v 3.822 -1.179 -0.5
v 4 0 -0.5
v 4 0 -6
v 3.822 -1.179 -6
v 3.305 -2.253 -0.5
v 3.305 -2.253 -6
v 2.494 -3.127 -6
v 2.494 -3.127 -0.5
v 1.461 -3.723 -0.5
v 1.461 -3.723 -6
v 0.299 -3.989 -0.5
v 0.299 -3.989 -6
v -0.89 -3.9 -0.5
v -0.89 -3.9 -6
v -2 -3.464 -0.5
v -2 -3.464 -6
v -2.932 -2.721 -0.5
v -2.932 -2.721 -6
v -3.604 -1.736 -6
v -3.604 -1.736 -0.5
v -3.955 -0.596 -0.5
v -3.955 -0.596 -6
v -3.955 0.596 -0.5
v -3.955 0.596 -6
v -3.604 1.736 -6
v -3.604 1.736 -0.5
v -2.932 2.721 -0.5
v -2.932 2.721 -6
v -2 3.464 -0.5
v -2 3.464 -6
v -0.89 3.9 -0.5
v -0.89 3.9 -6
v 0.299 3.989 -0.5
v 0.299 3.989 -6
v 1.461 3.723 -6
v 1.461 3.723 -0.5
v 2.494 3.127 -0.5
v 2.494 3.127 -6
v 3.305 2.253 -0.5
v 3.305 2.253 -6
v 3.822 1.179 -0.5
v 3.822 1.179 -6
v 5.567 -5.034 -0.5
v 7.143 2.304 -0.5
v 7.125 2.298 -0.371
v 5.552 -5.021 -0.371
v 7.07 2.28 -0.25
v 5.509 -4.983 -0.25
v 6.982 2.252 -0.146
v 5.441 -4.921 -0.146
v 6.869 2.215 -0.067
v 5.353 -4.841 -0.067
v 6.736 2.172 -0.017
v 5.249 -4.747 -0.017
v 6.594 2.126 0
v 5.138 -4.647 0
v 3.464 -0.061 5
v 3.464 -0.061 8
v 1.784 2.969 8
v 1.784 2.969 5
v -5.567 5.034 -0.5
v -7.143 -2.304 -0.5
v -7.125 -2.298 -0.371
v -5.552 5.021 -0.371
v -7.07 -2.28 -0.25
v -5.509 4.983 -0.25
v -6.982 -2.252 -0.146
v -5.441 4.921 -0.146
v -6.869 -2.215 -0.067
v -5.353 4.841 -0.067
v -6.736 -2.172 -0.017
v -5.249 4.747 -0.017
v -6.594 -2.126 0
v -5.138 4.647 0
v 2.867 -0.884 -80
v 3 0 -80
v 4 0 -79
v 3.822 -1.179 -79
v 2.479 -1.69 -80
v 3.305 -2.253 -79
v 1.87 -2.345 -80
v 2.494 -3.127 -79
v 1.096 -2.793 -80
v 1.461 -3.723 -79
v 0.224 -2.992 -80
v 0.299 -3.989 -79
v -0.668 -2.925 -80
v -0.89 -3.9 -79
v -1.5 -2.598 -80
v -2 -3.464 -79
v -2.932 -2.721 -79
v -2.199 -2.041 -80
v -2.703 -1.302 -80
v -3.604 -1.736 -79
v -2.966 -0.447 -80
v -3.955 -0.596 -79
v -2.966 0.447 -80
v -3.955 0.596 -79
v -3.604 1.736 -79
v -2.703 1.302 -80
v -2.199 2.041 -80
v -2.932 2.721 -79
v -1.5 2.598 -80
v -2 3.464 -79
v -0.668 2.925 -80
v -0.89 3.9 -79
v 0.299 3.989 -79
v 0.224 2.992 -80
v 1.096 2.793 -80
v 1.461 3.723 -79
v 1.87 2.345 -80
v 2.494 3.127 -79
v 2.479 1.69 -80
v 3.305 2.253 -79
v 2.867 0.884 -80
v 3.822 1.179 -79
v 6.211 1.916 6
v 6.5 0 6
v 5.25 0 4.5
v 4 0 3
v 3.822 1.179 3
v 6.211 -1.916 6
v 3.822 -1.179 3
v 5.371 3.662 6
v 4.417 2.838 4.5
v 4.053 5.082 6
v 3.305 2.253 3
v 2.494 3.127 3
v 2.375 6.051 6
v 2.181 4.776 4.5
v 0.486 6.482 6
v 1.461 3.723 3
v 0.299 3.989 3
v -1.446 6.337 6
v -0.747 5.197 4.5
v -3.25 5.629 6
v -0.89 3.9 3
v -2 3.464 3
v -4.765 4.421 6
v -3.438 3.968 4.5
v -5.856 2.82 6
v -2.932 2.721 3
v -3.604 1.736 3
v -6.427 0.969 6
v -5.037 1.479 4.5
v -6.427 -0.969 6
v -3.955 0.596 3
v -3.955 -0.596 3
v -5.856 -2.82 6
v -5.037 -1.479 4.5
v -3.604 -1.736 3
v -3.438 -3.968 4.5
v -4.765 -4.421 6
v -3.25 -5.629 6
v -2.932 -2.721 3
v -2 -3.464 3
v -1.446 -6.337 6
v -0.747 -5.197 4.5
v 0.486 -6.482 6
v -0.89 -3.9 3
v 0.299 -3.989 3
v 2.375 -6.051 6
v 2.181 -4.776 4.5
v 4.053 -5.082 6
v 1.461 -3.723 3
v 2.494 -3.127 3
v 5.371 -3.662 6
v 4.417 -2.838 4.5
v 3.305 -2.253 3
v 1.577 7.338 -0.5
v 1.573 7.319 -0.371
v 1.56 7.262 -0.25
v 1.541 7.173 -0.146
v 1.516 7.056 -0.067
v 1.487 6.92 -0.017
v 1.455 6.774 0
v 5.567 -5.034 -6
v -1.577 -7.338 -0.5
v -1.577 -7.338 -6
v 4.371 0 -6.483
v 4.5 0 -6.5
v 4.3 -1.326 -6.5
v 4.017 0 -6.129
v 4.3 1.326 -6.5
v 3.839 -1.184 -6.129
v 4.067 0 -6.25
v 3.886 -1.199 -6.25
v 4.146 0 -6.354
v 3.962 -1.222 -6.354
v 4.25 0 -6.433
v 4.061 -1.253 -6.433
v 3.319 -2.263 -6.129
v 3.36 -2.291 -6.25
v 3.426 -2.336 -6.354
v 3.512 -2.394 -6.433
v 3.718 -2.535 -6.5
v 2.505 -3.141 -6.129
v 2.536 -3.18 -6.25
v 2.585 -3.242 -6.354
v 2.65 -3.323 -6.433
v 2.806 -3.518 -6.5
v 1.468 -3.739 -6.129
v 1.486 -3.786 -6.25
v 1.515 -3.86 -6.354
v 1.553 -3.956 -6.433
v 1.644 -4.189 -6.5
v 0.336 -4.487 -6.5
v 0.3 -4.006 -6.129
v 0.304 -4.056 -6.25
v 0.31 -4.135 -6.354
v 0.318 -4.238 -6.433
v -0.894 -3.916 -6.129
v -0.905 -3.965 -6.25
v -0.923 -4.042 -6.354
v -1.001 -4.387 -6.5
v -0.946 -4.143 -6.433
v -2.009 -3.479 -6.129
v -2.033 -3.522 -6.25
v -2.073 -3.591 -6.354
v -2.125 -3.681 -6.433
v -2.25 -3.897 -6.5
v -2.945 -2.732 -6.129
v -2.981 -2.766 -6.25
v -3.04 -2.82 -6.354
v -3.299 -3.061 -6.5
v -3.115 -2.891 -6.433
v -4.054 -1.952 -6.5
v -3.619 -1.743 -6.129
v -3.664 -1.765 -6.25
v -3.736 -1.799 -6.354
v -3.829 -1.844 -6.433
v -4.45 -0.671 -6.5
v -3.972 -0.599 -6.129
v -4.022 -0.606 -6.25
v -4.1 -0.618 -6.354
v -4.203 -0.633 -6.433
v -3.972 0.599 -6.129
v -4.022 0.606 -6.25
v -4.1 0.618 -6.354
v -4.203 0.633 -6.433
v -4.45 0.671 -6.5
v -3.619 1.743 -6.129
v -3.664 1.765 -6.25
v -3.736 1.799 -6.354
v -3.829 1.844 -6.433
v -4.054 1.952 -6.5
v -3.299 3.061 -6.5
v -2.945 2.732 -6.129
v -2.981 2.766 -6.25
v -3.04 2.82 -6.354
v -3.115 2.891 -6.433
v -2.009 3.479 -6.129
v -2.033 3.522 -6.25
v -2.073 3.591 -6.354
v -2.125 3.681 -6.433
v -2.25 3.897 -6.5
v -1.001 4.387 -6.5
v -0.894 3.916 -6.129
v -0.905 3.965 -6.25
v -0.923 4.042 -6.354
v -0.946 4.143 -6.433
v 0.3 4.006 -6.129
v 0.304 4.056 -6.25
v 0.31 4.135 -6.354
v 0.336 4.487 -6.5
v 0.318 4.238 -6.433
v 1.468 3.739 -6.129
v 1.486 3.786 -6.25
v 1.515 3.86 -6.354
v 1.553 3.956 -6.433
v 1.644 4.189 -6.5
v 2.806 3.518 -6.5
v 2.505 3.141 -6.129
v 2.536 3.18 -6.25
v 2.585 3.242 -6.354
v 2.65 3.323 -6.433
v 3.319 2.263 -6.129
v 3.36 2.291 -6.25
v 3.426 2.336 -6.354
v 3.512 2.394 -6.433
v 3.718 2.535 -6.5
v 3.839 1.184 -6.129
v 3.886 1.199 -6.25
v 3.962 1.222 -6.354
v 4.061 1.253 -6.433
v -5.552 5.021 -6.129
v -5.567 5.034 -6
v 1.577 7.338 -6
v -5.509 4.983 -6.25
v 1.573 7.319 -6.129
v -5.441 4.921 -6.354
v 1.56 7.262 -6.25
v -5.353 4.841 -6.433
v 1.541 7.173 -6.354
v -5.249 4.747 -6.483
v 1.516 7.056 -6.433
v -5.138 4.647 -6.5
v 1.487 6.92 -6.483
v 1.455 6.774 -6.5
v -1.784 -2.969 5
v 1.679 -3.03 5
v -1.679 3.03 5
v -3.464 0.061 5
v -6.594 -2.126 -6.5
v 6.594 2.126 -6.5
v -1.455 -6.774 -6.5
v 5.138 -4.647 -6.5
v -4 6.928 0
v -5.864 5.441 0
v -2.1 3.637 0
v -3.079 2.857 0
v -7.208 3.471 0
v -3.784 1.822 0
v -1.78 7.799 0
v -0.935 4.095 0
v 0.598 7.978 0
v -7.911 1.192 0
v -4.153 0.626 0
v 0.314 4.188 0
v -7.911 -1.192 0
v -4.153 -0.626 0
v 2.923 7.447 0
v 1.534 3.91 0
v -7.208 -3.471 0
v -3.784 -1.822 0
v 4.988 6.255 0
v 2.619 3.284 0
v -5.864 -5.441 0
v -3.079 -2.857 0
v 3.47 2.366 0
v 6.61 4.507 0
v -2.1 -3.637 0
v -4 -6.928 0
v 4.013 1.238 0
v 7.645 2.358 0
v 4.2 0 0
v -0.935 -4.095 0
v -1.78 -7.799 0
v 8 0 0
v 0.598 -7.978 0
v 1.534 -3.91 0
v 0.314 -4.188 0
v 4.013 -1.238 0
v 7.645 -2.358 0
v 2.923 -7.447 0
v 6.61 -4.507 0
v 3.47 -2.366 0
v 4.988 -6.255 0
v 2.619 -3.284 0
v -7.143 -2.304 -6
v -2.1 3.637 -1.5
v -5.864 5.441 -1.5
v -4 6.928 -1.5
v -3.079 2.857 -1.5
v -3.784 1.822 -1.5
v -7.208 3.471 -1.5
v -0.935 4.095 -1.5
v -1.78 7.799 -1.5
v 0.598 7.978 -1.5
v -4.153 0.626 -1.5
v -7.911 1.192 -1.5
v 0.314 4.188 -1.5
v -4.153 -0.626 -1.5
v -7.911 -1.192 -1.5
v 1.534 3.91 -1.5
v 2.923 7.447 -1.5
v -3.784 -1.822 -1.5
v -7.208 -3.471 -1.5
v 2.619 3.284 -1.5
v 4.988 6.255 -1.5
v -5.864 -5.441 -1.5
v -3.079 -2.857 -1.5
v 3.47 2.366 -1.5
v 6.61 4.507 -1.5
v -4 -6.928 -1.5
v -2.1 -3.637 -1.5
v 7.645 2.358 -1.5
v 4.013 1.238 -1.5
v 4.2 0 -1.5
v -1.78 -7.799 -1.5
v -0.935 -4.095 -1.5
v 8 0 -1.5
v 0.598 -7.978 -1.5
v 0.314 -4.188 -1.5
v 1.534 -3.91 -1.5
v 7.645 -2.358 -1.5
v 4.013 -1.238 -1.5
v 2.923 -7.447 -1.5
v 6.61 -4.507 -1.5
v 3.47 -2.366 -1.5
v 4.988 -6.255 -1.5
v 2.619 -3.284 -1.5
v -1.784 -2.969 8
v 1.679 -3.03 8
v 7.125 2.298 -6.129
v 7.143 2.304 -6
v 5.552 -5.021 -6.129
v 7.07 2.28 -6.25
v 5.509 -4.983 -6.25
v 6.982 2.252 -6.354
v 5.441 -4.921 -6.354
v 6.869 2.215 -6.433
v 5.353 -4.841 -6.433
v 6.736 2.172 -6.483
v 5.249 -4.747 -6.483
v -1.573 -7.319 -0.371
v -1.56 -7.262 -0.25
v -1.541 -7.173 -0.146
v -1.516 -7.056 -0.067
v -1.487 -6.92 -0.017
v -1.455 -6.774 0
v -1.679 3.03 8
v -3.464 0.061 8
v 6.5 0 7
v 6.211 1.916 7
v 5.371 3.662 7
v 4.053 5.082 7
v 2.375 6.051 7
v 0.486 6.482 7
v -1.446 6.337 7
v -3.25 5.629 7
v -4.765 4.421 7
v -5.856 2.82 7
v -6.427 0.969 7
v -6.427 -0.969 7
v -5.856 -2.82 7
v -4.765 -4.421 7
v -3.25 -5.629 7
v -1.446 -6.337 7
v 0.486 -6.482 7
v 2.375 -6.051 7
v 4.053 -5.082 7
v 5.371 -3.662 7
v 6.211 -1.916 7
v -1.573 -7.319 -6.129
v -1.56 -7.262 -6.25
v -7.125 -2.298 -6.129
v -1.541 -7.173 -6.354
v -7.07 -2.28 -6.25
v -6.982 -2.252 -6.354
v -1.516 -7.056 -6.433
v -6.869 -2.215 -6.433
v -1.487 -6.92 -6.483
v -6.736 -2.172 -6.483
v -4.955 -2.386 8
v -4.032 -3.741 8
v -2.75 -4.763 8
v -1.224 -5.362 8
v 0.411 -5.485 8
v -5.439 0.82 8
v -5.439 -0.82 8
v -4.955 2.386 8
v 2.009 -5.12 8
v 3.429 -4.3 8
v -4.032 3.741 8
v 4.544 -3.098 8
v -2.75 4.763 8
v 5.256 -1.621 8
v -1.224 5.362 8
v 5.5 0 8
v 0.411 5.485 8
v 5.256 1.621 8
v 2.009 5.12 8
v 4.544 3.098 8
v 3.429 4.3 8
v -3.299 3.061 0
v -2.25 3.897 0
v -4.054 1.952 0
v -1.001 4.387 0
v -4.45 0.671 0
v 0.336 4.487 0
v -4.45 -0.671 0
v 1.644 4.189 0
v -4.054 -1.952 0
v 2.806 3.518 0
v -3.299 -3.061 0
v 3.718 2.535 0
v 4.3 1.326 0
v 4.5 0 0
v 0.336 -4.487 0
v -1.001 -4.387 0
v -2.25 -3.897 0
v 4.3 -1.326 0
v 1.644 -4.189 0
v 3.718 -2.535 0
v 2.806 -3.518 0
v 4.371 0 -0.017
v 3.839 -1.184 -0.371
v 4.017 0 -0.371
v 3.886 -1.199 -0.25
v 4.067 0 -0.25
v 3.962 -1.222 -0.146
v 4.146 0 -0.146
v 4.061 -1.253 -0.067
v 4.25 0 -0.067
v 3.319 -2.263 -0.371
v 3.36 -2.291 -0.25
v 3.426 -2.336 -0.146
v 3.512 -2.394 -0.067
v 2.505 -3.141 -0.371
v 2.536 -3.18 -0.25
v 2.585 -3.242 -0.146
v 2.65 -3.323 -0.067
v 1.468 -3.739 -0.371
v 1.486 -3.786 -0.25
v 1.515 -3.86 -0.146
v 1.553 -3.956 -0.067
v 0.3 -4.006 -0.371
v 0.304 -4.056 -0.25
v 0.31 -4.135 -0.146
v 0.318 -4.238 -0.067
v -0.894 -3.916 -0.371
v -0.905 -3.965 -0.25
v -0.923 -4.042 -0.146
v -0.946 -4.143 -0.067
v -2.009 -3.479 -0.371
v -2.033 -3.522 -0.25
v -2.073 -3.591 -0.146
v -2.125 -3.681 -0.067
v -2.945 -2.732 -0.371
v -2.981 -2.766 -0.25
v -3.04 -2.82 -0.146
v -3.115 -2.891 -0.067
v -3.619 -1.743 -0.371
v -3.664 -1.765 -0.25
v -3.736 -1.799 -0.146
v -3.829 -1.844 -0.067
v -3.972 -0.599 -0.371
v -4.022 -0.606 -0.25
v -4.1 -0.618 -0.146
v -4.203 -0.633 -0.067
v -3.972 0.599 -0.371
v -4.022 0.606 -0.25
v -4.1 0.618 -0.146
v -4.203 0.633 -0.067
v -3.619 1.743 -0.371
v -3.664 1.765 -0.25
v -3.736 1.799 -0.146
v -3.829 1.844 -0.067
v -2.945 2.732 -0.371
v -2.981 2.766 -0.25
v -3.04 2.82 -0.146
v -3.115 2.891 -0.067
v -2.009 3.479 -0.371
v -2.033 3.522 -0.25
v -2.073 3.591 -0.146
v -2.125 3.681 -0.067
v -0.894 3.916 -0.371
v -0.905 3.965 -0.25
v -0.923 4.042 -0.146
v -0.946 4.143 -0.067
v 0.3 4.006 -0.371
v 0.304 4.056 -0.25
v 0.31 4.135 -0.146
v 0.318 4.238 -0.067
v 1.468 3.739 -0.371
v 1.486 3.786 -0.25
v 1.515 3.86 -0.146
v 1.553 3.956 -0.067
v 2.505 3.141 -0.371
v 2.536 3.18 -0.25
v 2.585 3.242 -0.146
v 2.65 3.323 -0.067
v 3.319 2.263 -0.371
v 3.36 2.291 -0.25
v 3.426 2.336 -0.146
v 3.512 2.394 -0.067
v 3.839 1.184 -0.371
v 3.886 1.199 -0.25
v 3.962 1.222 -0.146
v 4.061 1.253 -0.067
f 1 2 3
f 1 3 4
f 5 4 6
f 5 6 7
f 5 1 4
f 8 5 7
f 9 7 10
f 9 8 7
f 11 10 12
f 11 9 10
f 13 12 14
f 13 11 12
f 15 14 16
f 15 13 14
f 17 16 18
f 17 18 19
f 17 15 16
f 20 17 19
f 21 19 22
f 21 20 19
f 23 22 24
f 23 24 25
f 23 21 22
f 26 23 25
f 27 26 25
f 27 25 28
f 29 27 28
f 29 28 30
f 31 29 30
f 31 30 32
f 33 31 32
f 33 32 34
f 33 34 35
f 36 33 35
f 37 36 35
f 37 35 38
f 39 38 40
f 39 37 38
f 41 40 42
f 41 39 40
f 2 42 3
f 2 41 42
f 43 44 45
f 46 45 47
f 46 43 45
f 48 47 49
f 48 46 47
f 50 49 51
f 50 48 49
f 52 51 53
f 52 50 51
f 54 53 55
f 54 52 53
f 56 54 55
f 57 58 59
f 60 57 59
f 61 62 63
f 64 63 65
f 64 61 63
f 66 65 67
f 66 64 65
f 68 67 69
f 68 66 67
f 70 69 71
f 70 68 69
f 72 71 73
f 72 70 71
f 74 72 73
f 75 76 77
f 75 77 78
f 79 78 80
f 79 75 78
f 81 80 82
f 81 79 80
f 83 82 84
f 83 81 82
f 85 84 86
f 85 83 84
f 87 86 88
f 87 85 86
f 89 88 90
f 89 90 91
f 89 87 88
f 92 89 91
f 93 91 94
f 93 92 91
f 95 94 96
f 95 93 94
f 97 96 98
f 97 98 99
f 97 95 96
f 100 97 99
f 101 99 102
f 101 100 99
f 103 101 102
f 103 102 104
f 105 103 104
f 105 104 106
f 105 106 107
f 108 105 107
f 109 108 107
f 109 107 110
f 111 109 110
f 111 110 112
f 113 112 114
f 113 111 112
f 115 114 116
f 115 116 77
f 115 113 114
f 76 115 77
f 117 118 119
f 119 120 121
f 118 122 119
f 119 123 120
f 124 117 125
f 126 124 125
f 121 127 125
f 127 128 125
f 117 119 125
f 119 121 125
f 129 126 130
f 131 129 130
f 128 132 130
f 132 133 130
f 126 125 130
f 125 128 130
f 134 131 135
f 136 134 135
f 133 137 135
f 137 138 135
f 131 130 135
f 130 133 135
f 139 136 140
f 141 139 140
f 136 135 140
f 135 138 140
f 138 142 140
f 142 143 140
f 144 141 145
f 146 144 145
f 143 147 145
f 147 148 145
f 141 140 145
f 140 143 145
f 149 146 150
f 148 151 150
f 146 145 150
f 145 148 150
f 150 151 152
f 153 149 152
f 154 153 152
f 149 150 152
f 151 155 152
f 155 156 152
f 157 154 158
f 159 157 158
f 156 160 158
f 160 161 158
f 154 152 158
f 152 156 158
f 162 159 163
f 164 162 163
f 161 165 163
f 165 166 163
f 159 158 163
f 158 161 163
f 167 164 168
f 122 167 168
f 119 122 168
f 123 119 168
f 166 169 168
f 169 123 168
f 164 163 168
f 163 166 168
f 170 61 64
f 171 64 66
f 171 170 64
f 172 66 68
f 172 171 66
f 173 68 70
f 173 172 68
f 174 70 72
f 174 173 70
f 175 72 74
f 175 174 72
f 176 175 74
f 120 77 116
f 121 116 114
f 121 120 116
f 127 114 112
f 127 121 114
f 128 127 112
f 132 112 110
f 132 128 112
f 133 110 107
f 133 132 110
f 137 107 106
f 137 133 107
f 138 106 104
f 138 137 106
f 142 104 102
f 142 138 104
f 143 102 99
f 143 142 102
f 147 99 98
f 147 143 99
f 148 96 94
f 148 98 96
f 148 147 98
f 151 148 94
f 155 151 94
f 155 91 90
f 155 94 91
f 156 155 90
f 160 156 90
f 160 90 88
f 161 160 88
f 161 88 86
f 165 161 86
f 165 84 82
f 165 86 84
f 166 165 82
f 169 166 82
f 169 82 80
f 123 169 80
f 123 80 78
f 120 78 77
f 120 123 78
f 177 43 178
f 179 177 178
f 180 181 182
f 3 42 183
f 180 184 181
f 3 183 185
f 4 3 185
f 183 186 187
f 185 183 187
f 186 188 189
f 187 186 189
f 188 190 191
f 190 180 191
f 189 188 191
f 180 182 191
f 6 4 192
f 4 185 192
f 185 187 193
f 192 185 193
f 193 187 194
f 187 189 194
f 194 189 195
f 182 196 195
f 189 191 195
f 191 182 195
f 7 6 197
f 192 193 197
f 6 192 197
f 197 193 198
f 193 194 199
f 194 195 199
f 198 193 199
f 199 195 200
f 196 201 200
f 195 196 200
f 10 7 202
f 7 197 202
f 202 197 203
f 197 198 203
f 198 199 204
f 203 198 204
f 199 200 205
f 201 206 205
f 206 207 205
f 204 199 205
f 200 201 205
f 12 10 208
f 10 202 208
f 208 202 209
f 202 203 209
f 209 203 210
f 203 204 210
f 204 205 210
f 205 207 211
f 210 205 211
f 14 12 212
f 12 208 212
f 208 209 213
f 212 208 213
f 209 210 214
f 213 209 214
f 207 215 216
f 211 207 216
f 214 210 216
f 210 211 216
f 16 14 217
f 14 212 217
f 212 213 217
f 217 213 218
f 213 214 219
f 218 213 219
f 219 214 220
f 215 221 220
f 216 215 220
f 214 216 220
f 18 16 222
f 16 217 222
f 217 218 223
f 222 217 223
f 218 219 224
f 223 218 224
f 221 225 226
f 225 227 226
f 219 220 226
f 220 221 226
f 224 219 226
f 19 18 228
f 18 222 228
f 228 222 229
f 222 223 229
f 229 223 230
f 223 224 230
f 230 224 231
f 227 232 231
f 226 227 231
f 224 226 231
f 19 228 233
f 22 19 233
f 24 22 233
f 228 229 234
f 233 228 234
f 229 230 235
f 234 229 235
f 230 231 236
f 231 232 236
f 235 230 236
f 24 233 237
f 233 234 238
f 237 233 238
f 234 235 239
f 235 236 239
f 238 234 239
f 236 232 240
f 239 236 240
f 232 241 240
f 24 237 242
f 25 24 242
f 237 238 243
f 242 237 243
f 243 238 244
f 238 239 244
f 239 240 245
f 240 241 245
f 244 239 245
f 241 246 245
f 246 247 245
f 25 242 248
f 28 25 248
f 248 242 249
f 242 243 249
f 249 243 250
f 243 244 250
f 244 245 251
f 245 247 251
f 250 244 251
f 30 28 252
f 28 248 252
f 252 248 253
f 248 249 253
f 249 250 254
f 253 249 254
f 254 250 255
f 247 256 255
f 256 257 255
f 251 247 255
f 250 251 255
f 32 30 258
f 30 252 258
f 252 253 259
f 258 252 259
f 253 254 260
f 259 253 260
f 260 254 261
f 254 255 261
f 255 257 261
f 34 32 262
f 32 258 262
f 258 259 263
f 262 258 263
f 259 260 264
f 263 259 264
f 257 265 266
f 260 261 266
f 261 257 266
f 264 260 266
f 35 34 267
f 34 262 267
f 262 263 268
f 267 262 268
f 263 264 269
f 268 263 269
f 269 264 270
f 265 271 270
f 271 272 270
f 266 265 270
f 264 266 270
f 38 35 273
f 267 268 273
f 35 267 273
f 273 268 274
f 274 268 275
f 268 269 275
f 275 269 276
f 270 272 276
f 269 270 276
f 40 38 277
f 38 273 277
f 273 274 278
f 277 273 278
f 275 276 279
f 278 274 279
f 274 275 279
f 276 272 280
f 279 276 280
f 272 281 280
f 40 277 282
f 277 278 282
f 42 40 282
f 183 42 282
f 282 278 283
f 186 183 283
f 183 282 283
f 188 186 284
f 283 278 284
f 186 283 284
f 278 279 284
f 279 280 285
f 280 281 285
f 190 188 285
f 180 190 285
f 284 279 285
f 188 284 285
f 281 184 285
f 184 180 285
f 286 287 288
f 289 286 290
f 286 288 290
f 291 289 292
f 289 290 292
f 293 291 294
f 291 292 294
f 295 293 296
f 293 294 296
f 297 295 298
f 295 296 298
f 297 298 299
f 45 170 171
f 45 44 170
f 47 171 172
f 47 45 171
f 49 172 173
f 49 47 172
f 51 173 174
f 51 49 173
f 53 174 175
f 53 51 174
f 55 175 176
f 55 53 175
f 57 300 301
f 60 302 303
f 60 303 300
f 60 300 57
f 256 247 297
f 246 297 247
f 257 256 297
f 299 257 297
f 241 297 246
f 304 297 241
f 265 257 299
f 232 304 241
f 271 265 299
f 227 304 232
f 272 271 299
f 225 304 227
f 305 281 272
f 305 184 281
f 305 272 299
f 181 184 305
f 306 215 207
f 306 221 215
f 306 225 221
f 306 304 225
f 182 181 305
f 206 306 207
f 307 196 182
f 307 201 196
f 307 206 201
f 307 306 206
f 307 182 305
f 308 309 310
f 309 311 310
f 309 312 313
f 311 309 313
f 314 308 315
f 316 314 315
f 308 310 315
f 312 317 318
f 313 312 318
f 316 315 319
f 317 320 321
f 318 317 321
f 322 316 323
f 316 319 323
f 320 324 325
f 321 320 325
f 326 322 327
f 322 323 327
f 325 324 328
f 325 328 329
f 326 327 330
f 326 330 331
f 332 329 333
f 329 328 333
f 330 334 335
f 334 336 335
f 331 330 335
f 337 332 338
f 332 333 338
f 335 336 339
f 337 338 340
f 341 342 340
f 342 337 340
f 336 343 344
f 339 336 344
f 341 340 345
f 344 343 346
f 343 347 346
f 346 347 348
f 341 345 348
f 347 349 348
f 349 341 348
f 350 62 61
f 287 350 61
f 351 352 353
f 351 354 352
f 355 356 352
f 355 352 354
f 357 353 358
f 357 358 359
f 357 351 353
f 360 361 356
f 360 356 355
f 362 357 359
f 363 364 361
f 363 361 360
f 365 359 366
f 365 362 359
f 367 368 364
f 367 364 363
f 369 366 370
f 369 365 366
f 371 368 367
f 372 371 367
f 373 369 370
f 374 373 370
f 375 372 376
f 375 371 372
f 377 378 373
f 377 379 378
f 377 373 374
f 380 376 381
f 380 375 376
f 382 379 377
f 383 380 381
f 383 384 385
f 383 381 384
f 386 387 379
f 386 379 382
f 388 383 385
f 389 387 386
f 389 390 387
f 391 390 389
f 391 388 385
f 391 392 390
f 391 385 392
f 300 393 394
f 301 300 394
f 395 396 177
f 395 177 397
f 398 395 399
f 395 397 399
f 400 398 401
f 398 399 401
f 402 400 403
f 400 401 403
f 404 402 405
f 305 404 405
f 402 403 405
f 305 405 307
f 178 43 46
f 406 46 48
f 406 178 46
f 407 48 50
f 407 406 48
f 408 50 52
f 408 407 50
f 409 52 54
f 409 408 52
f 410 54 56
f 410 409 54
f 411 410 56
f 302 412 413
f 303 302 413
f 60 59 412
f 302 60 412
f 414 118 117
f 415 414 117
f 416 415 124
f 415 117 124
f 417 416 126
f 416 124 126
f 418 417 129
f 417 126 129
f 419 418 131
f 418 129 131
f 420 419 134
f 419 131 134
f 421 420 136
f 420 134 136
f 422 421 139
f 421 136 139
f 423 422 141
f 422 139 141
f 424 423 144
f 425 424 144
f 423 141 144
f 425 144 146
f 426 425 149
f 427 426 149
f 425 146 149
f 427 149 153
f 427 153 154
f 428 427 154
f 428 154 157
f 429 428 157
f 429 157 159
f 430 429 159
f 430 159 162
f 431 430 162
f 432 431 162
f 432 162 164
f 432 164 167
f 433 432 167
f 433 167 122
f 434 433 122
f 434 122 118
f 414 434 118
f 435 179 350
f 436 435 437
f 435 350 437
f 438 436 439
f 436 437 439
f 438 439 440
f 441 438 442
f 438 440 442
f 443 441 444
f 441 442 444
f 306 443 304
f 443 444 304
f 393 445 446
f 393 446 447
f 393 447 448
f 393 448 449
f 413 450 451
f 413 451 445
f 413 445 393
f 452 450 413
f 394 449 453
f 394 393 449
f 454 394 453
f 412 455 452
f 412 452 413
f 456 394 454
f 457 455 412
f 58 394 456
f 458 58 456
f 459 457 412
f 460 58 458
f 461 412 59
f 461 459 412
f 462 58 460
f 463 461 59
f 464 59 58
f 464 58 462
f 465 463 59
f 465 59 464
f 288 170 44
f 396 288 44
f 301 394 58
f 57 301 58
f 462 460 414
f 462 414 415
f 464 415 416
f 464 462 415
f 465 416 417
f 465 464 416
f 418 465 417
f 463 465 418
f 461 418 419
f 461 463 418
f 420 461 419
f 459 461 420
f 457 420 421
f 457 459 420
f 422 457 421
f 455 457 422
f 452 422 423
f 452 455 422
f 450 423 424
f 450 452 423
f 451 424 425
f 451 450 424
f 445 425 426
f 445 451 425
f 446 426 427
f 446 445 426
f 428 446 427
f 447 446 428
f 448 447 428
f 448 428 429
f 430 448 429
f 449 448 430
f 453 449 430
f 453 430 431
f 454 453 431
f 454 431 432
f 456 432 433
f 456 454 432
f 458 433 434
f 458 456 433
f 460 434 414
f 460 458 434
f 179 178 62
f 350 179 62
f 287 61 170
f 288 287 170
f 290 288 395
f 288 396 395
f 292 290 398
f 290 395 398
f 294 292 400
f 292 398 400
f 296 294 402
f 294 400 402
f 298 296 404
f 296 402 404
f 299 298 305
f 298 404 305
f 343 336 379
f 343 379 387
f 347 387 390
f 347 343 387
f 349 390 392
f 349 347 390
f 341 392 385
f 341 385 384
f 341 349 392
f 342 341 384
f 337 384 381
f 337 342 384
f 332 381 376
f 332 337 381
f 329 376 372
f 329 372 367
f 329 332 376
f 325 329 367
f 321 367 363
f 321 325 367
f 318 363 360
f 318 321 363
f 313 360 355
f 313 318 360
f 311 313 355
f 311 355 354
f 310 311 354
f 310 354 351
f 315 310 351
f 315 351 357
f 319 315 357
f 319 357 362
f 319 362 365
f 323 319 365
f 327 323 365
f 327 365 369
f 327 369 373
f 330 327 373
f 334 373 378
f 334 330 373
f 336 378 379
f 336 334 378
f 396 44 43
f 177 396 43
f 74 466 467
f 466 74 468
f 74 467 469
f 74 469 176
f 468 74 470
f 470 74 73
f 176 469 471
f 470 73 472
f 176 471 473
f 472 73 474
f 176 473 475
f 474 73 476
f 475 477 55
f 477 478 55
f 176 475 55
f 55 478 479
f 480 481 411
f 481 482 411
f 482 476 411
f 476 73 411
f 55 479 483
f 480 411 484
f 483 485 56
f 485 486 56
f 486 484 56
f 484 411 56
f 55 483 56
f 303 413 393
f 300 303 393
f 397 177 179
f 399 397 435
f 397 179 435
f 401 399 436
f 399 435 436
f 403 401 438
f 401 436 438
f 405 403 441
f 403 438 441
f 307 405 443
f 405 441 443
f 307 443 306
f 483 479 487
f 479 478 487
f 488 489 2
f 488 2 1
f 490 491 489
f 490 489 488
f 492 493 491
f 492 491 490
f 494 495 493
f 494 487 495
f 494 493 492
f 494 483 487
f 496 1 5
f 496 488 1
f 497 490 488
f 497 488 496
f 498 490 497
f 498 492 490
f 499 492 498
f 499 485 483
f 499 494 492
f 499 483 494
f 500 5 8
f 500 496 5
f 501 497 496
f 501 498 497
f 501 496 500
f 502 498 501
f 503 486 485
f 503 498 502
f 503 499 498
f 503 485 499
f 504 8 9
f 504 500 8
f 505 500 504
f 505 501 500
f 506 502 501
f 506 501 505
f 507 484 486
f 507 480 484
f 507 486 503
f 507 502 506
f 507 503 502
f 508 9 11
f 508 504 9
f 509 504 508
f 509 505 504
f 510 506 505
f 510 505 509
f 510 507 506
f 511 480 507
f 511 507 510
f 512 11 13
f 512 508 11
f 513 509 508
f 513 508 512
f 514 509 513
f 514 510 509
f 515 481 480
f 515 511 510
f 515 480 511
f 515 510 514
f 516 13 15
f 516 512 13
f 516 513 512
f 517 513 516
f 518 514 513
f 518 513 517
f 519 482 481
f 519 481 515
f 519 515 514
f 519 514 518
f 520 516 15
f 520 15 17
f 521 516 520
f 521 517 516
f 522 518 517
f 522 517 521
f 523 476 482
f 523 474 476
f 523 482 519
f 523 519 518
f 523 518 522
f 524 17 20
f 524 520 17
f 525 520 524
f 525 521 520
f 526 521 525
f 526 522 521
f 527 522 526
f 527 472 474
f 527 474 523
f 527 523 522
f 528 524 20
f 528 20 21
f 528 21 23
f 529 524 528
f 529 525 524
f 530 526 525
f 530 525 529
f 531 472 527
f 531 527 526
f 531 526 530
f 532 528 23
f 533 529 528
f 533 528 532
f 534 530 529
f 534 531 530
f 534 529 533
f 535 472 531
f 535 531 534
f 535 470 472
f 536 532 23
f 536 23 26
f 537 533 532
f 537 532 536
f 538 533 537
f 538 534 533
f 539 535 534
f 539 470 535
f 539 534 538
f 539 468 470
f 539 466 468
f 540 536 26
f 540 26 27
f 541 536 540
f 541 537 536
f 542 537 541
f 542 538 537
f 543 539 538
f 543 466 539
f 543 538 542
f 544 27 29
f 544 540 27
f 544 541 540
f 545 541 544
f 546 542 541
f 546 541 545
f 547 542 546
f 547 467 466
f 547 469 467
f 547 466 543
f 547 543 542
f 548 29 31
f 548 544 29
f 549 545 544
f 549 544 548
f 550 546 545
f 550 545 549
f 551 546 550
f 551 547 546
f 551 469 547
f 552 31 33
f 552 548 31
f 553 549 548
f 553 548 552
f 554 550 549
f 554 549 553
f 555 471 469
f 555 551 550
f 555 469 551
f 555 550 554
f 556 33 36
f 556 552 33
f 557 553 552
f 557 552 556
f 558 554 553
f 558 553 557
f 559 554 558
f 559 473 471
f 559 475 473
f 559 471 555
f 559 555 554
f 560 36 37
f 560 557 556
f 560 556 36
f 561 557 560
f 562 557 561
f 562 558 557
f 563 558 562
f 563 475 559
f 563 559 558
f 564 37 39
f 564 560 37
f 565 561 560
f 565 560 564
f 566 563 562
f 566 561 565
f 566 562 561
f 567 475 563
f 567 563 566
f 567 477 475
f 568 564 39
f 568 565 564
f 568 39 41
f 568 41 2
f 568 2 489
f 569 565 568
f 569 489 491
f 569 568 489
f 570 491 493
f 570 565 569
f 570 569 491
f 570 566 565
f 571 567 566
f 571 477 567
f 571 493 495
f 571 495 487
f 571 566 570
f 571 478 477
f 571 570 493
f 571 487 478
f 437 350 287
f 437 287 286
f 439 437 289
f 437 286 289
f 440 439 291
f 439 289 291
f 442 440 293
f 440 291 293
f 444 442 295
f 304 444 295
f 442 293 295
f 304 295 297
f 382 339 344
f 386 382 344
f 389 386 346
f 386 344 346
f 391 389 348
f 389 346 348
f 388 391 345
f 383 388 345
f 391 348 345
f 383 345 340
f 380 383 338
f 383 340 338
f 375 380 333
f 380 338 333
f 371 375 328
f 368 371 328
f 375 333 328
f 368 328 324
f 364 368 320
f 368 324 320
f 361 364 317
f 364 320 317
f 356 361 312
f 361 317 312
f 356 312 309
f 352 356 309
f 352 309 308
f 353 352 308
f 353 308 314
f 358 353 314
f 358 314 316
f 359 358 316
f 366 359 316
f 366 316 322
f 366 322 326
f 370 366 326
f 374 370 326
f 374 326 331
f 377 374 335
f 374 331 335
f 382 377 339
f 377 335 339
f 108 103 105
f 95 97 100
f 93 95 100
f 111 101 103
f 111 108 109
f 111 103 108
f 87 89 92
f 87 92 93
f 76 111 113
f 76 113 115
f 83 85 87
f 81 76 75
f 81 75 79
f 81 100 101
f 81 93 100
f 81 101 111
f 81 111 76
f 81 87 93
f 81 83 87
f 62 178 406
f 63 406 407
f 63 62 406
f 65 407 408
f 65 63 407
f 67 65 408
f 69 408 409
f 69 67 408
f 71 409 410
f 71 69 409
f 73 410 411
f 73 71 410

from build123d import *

# Parameters (mm, degrees)
F0_R         = 6.5
F1_DEPTH     = 8
F2_R         = 4
F3_DEPTH     = 80
F5_DEPTH     = 3
F6_SIZE      = 1
F7_R         = 4
F8_DEPTH     = 6.5
F9_R         = 0.5
F10_R        = 8
F10_R_2      = 4.2
F11_DEPTH    = 1.5
F12_S5_R     = 4
F12_T6_DEPTH = 11


# Not quite as in the source:
# - a fillet or chamfer that OpenCascade refuses, or shapes differently, is made with other operations: its cross-section is extruded or revolved along the edge and cut away or added


with BuildPart() as f1:
    # F0 (on Top) → F1 (new body)
    with BuildSketch(Plane.XY):
        Circle(F0_R)
    extrude(amount=F1_DEPTH)

    # F2 (on face) → F3 (join)
    with BuildSketch(Plane(origin=(0, 0, 0), x_dir=(1, 0, 0), z_dir=(0, 0, -1))):
        Circle(F2_R)
    extrude(amount=F3_DEPTH)

    # F4 (on face) → F5 (cut)
    with BuildSketch(Plane.XY.offset(8)):
        Polygon((-1.6792826051, 3.0298531206), (-3.4635710747, 0.0606251641), (-1.7842884696, -2.9692279564), (1.6792826051, -3.0298531206), (3.4635710747, -0.0606251641), (1.7842884696, 2.9692279564), align=None)
    extrude(amount=-F5_DEPTH, mode=Mode.SUBTRACT)

    # F6
    f6_edges = [f1.edges().sort_by_distance(p)[0] for p in [
        (-4, 0, -80),
        (-6.5, 0, 8),
    ]]
    chamfer(f6_edges, length=F6_SIZE)

    # F12: chamfer of 6 x 5 on 1 edges, made by hand


with BuildPart() as f8:
    # F7 (on face) → F8 (new body)
    with BuildSketch(Plane(origin=(0, 0, 0), x_dir=(1, 0, 0), z_dir=(0, 0, -1))):
        Polygon((1.5766953018, -7.3380764004), (7.1433082286, -2.3035800149), (5.5666129268, 5.0344963856), (-1.5766953018, 7.3380764004), (-7.1433082286, 2.3035800149), (-5.5666129268, -5.0344963856), align=None)
        Circle(F7_R, mode=Mode.SUBTRACT)
    extrude(amount=F8_DEPTH)

    # F9
    f9_edges = [f8.edges().sort_by_distance(p)[0] for p in [
        (-6.354961, 1.365458, -6.5),
        (-1.994959, 6.186286, -6.5),
        (4.360002, 4.820828, -6.5),
        (6.354961, -1.365458, -6.5),
        (1.994959, -6.186286, -6.5),
        (-4.360002, -4.820828, -6.5),
        (-4, 0, -6.5),
        (-6.354961, 1.365458, 0),
        (-1.994959, 6.186286, 0),
        (4.360002, 4.820828, 0),
        (6.354961, -1.365458, 0),
        (1.994959, -6.186286, 0),
        (-4.360002, -4.820828, 0),
        (-4, 0, 0),
    ]]
    fillet(f9_edges, radius=F9_R)


with BuildPart() as f11:
    # F10 (on face) → F11 (new body)
    with BuildSketch(Plane(origin=(0, 0, 0), x_dir=(1, 0, 0), z_dir=(0, 0, -1))):
        Circle(F10_R)
        Circle(F10_R_2, mode=Mode.SUBTRACT)
    extrude(amount=F11_DEPTH)


with BuildPart() as f12_tool2:
    # F12_s3 → F12_t4 (revolve)
    with BuildSketch(Plane.XZ):
        Polygon((6.5, 6), (1.5, 0), (6.5, 0), align=None)
    revolve(axis=Axis((0, 0, 0), (0, 0, 1)))

    # F12_s5 → F12_t6 (cut, symmetric)
    with BuildSketch(Plane.XY.offset(3)):
        Circle(F12_S5_R)
    extrude(amount=F12_T6_DEPTH, both=True, mode=Mode.SUBTRACT)


with BuildPart() as f1_1:
    add(f1.part)

    # F12_t1: cut F12_tool2
    add(f12_tool2.part, mode=Mode.SUBTRACT)


solid = Compound([f8.part, f11.part, f1_1.part])
